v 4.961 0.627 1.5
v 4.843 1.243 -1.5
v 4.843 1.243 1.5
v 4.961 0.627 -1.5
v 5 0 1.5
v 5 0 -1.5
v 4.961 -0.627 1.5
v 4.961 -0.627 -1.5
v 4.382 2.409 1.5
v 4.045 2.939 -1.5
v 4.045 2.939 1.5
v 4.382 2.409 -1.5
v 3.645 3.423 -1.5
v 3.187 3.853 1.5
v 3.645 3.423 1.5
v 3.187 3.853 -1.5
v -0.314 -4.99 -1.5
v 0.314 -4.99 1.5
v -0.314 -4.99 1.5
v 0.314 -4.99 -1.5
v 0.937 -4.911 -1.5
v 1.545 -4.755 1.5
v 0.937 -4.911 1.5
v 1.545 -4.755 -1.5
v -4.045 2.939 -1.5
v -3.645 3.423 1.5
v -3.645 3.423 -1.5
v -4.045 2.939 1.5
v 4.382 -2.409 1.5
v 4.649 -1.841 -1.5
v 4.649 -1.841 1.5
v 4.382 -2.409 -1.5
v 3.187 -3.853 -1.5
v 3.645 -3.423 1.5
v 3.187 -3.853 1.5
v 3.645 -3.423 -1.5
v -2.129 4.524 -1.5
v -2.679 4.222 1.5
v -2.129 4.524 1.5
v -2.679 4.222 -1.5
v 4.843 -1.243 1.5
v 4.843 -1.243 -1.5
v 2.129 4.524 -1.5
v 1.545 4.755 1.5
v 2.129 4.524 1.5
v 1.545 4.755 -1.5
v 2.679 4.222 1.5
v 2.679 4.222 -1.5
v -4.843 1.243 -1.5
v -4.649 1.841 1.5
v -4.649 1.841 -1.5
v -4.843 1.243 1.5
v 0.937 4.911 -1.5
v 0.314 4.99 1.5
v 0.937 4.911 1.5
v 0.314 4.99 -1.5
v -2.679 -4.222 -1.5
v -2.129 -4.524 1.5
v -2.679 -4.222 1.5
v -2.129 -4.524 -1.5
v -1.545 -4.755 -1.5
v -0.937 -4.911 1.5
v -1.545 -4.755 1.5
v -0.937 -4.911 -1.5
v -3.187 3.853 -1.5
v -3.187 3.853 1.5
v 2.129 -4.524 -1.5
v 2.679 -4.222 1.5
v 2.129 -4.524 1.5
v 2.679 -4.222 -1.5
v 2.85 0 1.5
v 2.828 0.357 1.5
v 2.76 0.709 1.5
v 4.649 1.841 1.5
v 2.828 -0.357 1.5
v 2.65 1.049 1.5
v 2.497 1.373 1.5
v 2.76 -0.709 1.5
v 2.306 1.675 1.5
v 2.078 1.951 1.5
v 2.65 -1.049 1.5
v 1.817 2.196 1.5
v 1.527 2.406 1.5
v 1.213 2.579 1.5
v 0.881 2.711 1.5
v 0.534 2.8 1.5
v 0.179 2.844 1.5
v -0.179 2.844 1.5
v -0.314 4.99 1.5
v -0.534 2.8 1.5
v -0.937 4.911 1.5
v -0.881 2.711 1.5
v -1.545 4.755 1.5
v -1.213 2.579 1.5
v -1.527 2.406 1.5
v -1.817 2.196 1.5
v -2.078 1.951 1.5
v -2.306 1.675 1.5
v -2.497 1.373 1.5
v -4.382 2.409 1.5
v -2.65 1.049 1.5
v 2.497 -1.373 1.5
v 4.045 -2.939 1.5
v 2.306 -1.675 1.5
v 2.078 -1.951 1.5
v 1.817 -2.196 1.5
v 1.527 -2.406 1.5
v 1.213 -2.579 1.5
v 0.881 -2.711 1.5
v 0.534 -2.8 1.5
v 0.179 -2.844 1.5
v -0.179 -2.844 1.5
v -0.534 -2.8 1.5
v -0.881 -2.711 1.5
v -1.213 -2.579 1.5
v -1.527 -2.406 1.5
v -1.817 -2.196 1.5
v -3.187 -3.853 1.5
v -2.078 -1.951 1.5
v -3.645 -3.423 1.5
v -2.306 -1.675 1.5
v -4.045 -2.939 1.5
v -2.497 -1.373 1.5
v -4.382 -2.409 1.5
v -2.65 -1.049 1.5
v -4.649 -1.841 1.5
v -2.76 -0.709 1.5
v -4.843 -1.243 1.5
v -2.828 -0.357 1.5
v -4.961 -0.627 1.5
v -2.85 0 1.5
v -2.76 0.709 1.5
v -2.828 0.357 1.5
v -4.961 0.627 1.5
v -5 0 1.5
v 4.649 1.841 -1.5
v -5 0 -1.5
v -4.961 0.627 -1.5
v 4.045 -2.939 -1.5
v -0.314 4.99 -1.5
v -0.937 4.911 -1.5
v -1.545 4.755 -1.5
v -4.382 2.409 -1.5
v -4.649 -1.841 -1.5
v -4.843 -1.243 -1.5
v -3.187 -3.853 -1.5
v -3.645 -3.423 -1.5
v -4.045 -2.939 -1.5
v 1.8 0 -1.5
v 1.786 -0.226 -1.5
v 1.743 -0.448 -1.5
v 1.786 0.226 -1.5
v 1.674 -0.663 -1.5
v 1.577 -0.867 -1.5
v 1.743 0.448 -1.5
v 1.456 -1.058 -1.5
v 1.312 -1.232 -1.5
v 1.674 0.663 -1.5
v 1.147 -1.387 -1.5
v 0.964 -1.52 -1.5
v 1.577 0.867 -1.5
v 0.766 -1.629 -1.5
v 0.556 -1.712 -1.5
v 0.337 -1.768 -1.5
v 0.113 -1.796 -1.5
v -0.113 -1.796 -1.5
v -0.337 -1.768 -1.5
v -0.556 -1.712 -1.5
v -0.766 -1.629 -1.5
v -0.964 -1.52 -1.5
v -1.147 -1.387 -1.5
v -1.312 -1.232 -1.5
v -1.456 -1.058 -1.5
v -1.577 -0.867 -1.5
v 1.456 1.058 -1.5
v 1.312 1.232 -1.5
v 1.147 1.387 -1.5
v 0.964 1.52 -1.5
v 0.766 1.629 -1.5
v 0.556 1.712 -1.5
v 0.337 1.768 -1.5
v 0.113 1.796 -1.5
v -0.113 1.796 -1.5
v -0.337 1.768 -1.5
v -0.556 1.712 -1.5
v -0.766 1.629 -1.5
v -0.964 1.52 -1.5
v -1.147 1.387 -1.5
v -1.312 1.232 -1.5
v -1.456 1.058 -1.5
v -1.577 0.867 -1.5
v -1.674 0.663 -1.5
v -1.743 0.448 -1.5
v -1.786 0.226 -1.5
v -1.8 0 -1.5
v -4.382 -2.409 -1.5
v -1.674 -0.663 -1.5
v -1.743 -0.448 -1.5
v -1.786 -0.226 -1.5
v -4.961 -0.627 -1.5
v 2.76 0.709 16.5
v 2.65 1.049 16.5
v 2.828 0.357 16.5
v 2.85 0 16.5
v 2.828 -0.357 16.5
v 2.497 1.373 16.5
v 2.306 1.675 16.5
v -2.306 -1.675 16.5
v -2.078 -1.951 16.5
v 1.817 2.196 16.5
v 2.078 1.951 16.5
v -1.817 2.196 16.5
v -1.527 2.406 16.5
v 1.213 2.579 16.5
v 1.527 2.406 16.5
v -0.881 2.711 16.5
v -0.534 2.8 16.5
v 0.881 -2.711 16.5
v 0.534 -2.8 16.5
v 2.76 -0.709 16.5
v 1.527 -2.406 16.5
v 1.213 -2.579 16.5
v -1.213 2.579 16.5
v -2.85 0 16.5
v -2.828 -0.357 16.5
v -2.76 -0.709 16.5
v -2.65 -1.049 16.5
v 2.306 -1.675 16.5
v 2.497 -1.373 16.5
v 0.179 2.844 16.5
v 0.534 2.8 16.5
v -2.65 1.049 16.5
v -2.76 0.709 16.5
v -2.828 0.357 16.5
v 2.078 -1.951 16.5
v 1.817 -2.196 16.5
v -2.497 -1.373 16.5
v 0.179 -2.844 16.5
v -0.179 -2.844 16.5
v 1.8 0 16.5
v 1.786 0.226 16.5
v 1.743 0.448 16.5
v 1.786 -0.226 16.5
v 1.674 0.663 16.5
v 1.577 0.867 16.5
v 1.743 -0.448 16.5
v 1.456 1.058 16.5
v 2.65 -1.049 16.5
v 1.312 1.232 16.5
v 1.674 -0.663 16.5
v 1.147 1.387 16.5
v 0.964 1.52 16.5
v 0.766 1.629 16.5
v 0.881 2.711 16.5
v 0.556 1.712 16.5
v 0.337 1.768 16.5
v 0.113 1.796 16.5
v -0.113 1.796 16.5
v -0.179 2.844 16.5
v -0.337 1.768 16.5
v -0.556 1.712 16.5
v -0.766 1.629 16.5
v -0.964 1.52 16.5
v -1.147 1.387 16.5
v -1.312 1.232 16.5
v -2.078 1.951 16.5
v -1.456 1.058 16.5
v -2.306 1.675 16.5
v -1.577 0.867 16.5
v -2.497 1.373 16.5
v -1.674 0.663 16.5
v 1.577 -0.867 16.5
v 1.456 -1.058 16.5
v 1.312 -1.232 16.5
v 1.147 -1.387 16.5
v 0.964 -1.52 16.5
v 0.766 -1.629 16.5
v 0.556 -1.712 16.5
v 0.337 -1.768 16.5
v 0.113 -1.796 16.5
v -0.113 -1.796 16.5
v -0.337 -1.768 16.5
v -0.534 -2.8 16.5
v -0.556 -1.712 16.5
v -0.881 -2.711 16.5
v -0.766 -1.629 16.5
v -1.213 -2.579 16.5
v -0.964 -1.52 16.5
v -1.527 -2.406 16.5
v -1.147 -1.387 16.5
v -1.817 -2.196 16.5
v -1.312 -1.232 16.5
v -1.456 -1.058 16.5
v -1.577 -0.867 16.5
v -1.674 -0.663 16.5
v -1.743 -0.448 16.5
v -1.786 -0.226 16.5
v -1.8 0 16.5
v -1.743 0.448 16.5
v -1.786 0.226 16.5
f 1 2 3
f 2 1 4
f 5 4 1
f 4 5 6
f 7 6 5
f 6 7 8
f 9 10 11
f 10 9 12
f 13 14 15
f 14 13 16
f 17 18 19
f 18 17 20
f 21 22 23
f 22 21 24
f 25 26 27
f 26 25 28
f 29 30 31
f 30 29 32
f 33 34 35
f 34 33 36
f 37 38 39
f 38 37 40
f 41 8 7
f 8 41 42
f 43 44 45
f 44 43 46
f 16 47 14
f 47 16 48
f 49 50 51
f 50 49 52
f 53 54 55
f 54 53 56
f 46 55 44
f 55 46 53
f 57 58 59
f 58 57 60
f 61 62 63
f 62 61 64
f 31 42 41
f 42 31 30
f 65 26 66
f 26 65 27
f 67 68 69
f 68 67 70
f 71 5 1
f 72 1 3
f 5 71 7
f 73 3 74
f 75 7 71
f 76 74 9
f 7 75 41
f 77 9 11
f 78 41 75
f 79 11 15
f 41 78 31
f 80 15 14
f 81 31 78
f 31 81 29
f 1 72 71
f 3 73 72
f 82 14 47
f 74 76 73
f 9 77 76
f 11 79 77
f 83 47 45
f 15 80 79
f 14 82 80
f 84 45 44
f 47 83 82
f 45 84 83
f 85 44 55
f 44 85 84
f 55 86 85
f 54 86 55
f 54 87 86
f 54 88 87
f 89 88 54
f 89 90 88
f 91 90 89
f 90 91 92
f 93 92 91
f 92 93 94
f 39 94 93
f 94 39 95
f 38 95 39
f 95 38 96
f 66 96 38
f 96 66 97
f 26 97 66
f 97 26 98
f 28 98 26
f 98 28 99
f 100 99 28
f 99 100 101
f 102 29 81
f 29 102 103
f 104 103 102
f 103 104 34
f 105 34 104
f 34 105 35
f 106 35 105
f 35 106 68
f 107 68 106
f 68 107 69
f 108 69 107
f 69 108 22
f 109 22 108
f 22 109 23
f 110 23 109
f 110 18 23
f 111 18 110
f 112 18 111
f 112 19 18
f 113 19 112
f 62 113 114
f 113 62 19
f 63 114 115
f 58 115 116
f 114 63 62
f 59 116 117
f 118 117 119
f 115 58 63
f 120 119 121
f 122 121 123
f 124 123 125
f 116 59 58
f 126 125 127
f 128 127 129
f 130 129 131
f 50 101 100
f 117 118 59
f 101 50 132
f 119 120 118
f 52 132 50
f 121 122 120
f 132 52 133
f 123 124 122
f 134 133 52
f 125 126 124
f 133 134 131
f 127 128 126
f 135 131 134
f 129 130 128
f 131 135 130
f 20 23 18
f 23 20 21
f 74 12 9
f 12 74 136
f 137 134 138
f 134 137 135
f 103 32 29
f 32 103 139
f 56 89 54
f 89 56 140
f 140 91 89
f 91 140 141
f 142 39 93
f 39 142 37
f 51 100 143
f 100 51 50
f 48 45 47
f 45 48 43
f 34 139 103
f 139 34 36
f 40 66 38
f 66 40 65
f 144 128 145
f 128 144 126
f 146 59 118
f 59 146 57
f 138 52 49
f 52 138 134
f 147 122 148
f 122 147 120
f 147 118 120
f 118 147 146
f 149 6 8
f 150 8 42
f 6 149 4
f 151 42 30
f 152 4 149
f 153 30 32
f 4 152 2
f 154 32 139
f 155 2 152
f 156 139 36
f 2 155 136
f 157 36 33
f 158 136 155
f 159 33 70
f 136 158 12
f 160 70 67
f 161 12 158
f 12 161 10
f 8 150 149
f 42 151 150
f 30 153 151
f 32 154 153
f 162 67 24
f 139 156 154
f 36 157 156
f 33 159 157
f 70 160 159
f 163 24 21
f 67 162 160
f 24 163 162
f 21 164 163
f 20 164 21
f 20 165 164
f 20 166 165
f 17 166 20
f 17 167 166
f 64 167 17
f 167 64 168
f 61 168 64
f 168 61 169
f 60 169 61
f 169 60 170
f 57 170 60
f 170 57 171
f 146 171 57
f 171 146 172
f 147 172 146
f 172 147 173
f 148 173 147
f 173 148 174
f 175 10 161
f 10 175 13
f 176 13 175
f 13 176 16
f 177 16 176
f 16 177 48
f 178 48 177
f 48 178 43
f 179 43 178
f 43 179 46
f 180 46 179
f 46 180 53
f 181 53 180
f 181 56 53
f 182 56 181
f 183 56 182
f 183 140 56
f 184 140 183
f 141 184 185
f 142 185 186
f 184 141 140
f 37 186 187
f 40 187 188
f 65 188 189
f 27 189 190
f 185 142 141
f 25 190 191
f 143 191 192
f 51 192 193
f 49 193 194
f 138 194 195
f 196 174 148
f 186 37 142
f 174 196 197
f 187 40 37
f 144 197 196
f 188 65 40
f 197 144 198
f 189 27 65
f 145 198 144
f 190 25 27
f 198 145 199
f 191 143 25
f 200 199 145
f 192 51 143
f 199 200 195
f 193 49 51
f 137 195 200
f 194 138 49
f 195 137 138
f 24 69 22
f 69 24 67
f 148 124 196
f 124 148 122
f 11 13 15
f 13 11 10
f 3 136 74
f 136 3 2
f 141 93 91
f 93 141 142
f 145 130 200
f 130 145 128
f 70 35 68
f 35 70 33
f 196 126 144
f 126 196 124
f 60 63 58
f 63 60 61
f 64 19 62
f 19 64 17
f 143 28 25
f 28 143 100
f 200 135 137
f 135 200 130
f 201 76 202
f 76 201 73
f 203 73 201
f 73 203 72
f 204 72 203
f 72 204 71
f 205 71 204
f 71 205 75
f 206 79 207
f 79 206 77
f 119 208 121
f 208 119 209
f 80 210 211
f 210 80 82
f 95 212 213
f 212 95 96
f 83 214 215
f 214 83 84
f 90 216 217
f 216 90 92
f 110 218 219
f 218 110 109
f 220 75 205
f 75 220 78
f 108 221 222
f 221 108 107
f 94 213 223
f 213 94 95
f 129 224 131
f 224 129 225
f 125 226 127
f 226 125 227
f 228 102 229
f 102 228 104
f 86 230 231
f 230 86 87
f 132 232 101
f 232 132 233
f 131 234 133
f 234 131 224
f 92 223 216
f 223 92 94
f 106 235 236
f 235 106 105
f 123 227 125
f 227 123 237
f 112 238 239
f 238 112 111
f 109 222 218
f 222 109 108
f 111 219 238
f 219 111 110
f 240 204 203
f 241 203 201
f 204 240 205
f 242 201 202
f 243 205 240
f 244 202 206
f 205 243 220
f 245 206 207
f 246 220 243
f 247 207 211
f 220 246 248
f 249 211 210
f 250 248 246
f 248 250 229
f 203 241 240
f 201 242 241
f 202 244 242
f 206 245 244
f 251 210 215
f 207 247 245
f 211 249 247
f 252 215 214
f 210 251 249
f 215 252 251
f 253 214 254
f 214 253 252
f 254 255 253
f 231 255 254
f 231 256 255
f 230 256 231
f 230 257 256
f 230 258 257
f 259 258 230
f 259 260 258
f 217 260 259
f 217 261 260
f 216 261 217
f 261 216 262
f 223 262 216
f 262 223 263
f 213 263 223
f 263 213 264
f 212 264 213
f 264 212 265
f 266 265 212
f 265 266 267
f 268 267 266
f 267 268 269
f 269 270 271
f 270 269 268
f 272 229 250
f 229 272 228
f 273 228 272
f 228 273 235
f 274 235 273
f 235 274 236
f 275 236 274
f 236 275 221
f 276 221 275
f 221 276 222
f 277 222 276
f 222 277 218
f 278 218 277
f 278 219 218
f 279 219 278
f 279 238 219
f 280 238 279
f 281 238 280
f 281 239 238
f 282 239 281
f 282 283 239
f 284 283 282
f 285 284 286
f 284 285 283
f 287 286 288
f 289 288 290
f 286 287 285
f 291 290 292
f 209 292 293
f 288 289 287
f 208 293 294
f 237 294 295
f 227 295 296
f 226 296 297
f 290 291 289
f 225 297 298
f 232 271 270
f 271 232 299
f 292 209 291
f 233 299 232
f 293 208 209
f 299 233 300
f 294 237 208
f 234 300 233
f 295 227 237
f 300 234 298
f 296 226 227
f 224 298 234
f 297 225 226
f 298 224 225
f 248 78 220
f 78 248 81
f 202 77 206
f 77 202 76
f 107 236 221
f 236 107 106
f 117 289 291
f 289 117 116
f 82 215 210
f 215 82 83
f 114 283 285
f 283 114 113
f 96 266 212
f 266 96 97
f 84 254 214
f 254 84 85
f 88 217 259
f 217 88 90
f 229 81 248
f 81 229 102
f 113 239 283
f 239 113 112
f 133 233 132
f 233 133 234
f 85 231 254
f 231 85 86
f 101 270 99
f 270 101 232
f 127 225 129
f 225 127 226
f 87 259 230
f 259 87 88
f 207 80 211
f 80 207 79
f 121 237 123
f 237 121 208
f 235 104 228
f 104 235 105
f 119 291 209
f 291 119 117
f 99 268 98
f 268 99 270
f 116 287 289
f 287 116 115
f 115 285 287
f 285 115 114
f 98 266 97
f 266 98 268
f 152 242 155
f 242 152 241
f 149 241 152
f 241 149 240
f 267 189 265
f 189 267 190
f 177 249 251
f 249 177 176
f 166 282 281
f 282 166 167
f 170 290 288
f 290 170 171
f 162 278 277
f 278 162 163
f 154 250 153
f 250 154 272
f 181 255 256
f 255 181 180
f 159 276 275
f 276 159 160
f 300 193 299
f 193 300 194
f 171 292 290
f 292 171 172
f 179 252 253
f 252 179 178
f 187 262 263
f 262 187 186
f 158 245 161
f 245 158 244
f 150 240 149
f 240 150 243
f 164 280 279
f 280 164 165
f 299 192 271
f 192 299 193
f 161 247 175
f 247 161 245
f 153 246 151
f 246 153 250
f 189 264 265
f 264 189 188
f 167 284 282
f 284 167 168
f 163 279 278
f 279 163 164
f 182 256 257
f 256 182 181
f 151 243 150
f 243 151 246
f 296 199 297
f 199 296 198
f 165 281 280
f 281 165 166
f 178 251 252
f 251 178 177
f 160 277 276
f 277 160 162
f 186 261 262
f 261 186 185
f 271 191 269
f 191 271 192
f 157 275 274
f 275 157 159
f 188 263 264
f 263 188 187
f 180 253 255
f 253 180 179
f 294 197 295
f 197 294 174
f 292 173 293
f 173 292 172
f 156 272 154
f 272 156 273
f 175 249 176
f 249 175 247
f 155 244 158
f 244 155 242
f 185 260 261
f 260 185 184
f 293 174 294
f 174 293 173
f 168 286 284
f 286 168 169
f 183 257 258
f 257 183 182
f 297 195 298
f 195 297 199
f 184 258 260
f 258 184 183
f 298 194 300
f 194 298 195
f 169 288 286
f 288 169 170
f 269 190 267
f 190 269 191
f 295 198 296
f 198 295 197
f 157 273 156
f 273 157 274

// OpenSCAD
$fn = 50;


difference() {
	union() {
		translate(v = [0, 0, -1.5000000000]) {
			cylinder(h = 3, r = 5.0000000000);
		}
		translate(v = [0, 0, -1.5000000000]) {
			cylinder(h = 18, r = 2.8500000000);
		}
	}
	union() {
		translate(v = [0, 0, -100.0000000000]) {
			cylinder(h = 200, r = 1.8000000000);
		}
	}
}
